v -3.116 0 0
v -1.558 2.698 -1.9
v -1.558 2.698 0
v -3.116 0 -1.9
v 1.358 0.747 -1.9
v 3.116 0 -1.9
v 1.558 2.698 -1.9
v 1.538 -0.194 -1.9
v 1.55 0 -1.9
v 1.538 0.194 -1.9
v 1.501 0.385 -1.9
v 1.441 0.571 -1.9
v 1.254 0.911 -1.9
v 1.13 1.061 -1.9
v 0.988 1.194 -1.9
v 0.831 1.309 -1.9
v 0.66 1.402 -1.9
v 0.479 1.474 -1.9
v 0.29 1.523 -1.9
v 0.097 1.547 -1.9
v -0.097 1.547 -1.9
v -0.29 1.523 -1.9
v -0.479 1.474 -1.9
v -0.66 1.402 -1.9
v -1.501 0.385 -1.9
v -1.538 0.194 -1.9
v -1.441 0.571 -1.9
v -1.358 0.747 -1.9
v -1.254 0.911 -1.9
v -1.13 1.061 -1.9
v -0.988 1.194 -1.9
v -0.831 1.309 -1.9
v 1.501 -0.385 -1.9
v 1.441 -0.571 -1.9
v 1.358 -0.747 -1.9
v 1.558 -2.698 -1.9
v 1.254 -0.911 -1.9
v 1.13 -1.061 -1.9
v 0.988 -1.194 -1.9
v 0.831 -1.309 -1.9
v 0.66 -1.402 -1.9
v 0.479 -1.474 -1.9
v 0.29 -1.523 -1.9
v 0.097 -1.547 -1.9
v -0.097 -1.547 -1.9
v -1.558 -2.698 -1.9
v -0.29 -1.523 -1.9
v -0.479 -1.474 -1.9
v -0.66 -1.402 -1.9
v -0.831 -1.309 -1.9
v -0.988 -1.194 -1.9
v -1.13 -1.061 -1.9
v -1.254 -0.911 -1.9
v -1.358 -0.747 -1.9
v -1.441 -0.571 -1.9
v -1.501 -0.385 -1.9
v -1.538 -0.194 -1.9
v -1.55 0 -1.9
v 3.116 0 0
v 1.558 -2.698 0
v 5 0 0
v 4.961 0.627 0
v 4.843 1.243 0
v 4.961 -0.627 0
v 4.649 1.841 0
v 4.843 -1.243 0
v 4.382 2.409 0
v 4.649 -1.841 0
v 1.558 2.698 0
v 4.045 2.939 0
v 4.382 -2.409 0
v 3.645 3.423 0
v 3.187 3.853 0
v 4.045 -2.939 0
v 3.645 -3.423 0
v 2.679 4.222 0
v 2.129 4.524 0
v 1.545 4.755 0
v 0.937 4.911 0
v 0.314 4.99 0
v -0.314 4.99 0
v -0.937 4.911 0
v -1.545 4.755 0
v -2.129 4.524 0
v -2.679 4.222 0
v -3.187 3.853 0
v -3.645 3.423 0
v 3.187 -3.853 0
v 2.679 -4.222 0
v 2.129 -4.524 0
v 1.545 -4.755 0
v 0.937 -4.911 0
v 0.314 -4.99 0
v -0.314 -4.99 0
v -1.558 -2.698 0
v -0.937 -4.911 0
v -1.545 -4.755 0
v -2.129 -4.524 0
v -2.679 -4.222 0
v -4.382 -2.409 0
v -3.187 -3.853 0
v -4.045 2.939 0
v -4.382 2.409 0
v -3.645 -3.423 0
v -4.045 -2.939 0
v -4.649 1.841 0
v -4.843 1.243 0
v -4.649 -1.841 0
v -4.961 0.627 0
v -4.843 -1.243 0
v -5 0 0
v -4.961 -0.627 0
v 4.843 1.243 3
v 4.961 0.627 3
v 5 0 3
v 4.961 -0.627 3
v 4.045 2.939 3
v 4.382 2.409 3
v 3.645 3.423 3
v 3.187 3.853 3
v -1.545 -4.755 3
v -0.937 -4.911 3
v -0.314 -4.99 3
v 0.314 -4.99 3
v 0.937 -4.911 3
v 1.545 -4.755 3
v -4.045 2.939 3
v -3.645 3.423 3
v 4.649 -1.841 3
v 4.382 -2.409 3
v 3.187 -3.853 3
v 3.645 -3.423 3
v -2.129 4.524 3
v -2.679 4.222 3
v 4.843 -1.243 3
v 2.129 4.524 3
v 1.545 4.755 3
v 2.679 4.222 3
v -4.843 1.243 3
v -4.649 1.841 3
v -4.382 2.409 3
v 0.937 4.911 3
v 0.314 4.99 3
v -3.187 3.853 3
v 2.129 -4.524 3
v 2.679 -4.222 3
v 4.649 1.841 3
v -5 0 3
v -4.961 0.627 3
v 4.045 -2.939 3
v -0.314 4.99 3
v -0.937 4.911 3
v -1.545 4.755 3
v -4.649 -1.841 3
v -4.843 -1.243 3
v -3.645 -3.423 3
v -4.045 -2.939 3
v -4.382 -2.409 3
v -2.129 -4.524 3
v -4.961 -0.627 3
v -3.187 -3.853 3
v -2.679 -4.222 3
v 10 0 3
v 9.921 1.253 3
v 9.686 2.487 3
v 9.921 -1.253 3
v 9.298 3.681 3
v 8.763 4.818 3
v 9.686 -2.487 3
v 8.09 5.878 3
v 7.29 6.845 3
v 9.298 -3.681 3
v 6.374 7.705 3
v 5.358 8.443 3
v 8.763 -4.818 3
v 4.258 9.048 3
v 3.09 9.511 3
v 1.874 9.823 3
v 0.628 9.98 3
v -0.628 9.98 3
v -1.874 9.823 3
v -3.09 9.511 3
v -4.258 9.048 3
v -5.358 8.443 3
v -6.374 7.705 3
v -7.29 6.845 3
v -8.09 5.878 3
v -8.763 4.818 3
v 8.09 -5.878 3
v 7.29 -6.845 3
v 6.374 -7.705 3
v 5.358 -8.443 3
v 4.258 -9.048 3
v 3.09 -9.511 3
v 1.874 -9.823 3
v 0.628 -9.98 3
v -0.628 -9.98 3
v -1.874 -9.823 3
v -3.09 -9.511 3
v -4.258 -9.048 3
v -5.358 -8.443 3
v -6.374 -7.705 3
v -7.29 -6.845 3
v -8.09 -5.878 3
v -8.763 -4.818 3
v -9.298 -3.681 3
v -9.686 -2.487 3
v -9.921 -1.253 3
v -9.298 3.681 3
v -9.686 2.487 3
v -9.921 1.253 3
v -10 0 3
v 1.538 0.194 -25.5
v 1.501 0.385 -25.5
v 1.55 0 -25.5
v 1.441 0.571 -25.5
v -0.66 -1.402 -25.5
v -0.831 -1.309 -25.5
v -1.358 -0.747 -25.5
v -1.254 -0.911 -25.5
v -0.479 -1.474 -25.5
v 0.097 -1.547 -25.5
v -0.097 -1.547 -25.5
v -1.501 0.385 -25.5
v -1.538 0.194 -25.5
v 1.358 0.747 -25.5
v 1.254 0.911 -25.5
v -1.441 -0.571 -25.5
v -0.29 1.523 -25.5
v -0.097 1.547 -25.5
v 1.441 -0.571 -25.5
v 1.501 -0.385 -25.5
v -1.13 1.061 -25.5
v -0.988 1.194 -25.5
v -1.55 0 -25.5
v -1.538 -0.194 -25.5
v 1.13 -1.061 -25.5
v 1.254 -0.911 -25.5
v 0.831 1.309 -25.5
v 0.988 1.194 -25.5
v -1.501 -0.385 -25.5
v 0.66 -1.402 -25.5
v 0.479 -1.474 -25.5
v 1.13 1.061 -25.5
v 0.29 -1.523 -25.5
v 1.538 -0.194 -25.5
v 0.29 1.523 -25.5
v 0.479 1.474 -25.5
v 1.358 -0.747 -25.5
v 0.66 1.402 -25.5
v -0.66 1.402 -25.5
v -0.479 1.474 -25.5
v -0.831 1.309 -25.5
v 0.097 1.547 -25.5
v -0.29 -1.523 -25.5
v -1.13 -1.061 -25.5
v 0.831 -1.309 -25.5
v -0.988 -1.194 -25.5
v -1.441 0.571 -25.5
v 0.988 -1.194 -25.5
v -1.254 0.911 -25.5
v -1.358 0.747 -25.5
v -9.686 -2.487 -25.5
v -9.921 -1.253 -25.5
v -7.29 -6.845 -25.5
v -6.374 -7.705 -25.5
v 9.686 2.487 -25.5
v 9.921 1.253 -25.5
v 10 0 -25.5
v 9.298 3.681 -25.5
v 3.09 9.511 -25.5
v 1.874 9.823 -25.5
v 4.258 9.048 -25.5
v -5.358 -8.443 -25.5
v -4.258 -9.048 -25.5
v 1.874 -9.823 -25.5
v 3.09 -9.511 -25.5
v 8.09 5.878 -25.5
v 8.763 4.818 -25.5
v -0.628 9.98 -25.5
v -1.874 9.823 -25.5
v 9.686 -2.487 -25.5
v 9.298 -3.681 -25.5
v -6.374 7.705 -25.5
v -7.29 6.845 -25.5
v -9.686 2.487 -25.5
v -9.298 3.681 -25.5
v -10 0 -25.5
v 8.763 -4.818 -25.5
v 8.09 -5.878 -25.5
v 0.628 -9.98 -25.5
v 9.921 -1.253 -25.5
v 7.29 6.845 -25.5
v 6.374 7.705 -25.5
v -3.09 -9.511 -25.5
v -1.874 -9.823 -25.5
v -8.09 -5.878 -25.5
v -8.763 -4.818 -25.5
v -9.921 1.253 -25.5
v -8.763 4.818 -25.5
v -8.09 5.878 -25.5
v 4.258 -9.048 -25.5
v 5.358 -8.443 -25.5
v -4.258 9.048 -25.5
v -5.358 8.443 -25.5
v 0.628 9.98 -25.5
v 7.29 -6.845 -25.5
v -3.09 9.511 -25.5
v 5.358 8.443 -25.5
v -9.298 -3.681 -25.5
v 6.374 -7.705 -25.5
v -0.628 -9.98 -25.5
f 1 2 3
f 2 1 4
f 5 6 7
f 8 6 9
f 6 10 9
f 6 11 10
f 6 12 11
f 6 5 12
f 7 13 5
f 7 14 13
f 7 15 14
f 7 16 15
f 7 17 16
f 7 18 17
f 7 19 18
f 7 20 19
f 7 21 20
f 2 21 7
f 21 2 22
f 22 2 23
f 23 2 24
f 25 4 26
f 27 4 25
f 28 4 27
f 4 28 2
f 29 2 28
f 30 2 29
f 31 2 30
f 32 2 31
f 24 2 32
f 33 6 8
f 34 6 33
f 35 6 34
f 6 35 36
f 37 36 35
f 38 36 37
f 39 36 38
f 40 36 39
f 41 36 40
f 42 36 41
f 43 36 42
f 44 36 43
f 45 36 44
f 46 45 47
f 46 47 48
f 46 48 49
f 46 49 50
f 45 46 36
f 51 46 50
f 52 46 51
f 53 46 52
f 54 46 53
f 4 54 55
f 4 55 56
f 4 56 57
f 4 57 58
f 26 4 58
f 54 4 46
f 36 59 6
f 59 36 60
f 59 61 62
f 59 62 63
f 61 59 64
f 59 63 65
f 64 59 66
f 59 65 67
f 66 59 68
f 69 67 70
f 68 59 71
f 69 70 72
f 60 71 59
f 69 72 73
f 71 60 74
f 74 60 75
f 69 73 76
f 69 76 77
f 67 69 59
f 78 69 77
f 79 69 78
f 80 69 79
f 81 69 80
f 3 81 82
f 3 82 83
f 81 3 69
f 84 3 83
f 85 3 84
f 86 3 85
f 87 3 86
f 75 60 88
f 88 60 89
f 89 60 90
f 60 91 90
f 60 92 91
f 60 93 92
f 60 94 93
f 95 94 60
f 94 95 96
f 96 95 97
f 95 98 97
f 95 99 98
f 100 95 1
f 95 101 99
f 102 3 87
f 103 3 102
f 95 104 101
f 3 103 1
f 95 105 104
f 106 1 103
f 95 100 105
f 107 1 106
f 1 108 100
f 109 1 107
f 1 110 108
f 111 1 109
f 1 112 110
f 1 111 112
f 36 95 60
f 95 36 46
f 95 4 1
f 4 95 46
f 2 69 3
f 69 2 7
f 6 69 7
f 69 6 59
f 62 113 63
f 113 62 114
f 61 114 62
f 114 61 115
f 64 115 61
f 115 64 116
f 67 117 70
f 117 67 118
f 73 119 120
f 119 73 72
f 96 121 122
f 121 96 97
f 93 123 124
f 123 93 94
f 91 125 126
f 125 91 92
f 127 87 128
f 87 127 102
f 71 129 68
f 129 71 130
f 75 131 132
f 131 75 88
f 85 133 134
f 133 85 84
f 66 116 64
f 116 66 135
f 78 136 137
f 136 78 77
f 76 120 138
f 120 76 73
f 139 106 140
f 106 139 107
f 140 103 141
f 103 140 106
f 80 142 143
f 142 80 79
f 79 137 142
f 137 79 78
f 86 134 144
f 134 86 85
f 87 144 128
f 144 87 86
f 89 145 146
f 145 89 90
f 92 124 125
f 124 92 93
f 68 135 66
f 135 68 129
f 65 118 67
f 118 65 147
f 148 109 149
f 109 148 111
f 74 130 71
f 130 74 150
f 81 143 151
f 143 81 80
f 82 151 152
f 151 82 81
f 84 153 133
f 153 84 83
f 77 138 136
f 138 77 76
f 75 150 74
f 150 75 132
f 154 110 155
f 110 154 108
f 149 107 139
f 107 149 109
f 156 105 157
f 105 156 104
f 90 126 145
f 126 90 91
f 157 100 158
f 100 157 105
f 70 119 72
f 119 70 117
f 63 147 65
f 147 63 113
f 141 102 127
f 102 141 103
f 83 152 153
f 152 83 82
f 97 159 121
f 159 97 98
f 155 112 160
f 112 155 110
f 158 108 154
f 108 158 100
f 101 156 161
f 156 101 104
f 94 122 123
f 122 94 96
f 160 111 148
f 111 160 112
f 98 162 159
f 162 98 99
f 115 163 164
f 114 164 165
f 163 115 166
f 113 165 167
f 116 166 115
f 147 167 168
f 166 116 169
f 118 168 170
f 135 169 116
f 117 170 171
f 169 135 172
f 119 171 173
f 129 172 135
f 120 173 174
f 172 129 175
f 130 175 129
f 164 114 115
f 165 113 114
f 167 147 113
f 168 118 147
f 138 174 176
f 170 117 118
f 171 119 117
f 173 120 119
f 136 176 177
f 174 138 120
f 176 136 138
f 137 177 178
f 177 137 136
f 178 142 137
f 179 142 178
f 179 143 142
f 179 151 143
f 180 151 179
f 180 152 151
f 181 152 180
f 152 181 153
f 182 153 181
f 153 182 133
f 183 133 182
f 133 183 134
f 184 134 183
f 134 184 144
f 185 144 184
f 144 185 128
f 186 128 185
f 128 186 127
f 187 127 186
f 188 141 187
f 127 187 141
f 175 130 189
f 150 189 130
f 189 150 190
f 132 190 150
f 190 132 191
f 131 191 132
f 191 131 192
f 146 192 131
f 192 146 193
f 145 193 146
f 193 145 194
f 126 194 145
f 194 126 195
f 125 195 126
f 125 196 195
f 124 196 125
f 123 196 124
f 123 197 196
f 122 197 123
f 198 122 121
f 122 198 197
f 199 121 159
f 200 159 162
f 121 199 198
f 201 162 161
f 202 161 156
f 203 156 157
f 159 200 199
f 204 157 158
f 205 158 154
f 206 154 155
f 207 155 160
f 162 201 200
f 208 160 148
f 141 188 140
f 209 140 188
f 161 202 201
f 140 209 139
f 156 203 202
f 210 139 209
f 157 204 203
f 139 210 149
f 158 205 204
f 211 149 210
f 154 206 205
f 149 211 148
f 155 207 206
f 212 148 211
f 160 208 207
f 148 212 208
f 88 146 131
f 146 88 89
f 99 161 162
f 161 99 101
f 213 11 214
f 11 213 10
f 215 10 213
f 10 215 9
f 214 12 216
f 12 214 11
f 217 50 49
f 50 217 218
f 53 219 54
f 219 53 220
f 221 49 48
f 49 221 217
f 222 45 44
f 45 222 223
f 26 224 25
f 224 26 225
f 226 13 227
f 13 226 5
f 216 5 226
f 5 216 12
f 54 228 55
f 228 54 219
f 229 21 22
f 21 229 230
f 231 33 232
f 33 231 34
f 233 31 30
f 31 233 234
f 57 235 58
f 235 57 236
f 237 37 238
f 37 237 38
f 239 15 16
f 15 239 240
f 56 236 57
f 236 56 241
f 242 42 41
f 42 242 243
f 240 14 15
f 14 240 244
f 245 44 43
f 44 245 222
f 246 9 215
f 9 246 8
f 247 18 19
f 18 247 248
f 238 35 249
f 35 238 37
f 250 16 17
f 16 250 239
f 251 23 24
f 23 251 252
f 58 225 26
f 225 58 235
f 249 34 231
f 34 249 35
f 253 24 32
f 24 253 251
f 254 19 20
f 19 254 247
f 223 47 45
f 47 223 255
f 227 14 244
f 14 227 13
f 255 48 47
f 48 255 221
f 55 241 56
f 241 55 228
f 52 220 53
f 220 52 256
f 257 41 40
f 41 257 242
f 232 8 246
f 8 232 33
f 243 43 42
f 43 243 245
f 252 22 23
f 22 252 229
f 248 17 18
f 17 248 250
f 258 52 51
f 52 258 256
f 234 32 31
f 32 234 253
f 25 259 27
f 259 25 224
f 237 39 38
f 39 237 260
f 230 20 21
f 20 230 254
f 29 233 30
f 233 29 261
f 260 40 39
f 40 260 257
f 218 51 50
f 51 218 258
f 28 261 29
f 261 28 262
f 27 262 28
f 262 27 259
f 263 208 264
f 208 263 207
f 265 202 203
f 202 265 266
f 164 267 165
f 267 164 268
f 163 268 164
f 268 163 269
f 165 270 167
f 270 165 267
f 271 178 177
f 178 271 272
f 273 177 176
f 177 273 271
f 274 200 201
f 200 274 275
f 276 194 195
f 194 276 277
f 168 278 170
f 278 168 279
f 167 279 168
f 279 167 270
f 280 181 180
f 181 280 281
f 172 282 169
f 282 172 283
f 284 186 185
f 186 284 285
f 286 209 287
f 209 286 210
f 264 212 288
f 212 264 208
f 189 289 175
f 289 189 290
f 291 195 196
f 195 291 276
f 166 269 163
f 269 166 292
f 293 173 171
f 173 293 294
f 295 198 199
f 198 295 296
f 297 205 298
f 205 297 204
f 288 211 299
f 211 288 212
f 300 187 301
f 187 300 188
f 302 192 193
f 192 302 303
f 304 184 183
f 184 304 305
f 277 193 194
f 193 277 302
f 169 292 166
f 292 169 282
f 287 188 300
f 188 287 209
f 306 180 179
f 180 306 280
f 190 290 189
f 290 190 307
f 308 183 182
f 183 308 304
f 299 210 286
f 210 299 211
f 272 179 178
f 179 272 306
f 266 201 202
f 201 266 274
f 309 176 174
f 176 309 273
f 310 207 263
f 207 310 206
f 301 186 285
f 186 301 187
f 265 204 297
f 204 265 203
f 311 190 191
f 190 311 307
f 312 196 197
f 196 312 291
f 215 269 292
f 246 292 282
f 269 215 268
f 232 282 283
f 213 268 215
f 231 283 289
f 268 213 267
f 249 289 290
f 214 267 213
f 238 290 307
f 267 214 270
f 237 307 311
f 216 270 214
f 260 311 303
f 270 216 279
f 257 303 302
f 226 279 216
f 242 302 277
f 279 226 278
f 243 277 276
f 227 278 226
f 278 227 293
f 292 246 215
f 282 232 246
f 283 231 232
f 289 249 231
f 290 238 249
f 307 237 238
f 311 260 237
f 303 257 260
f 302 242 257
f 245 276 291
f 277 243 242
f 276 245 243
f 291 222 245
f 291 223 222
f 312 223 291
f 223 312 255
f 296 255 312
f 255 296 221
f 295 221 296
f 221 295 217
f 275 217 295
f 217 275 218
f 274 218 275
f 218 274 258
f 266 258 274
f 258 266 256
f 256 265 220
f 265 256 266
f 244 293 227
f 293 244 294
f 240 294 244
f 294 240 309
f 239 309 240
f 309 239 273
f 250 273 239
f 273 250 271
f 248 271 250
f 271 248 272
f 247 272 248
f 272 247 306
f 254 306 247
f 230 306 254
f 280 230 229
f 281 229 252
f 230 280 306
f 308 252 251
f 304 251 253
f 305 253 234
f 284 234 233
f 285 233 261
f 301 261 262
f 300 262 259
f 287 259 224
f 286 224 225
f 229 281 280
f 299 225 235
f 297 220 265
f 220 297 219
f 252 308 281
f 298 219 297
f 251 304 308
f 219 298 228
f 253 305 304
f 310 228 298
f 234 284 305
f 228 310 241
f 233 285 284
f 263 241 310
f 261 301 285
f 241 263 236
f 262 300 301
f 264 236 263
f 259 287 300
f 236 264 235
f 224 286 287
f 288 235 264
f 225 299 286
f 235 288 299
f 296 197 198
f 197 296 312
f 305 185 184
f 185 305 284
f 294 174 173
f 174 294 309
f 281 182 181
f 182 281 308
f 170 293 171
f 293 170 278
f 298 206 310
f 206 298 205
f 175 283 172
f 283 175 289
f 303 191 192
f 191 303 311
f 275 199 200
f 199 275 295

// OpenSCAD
$fn = 50;

difference() {
	union() {
		translate(v = [0, 0, -25.5]) {
			cylinder(h = 28.5, r = 10.0);
		}
	}
	union() {
		translate(v = [0, 0, 0]) {
			rotate(a = [0, 0, 0]) {
				difference() {
					union() {
						translate(v = [0, 0, -1.9]) {
							linear_extrude(height = 1.9) {
								polygon(points = [[3.1158, 0.0], [1.5579000000000005, 2.698361953111554], [-1.5578999999999994, 2.6983619531115544], [-3.1158, 3.815754496783323e-16], [-1.5579000000000014, -2.6983619531115535], [1.557899999999998, -2.6983619531115552]]);
							}
						}
					}
					union();
				}
			}
		}
		#cylinder(h = 3, r = 5.0);
		#translate(v = [0, 0, -100.0]) {
			cylinder(h = 200, r = 1.55);
		}
	}
}
